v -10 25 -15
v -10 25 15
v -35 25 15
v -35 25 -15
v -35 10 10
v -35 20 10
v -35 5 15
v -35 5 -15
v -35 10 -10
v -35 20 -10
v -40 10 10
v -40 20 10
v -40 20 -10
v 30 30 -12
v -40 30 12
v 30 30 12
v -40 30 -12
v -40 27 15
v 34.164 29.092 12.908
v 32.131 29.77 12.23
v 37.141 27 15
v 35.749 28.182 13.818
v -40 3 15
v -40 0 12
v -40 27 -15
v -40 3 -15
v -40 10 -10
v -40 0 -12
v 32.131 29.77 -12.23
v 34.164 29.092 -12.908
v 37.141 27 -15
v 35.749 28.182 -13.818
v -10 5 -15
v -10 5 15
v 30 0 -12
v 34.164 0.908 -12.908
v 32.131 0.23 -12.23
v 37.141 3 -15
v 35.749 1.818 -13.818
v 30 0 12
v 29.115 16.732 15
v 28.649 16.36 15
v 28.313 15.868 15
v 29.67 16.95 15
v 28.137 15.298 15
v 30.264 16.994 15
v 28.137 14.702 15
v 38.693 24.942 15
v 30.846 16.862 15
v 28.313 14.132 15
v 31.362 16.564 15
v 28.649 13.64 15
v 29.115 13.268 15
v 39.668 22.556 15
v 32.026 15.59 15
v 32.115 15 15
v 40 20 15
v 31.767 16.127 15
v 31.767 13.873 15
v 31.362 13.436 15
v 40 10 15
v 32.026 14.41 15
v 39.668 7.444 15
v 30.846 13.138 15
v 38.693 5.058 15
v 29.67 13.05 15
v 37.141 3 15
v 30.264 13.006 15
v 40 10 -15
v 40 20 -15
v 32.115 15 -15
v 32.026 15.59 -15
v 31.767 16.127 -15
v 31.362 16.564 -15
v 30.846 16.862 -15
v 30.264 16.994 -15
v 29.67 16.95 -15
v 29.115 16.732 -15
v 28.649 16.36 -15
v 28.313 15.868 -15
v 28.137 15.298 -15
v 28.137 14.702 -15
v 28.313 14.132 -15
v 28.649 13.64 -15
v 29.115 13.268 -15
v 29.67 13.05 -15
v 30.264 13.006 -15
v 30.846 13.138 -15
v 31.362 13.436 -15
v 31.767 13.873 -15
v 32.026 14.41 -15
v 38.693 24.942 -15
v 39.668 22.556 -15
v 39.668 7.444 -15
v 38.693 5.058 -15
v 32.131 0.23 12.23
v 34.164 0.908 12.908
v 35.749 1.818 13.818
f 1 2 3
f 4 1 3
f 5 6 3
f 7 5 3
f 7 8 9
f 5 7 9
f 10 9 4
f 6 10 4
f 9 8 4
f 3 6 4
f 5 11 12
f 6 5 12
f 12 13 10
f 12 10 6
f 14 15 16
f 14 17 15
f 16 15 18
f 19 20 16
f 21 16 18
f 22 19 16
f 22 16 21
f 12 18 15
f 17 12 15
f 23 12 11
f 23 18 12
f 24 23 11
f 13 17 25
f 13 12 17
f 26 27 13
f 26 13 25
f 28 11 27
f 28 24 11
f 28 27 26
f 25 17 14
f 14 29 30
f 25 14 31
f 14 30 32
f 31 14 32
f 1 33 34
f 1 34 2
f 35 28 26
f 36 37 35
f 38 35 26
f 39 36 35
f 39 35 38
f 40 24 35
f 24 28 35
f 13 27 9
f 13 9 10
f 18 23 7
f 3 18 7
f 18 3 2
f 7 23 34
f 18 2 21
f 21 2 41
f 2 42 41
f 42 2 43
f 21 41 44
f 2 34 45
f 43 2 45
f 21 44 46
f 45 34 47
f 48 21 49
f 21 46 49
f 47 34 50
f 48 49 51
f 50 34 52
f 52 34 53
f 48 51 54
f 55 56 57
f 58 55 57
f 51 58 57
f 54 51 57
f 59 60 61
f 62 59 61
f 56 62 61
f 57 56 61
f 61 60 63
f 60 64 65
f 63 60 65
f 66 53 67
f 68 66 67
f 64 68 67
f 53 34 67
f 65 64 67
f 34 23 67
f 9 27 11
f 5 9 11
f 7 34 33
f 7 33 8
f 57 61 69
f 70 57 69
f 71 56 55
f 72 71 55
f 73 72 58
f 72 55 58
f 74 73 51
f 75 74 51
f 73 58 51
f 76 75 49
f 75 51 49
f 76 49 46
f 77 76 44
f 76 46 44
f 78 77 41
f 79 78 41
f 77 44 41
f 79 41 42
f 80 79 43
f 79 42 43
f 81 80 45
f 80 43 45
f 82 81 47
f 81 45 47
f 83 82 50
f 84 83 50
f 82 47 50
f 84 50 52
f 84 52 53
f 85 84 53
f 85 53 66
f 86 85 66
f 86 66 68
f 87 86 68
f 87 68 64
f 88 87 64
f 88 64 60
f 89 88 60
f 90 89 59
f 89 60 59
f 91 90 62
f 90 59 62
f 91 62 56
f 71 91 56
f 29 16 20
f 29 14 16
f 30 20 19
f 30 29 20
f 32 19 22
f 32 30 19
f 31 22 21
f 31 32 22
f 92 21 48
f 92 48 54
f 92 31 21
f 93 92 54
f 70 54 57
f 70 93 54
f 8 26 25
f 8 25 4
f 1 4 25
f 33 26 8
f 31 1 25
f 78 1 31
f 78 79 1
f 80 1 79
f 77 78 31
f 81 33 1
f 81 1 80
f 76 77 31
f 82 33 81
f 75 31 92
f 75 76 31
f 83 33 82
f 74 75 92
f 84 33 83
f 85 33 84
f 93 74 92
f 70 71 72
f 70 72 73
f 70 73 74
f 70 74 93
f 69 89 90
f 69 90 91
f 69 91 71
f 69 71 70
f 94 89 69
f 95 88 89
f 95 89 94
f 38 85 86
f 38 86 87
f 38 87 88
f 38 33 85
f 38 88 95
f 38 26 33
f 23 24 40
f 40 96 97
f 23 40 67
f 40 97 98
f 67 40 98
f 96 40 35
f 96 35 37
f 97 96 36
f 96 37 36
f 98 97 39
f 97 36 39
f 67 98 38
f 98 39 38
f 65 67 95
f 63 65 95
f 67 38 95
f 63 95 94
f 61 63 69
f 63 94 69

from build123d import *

# Parameters (mm, degrees)
SKETCH1_W           = 80
SKETCH1_H           = 30
BOSS_EXTRUDE1_DEPTH = 30
SKETCH2_R           = 2
CUT_EXTRUDE1_DEPTH  = 30
CHAMFER1_SIZE       = 3
SKETCH3_W           = 25
SKETCH3_H           = 20
CUT_EXTRUDE2_DEPTH  = 30
SKETCH4_W           = 20
SKETCH4_H           = 10
CUT_EXTRUDE3_DEPTH  = 20
FILLET1_R           = 10


with BuildPart() as part:
    # Sketch1 → Boss-Extrude1 (new body)
    with BuildSketch(Plane(origin=(0, 0, 0), x_dir=(1, 0, 0), z_dir=(0, 1, 0))):
        Rectangle(SKETCH1_W, SKETCH1_H)
    extrude(amount=BOSS_EXTRUDE1_DEPTH)

    # Sketch2 → Cut-Extrude1 (cut)
    with BuildSketch(Plane.XY.offset(15)):
        with Locations((30.11486463, 15)):
            Circle(SKETCH2_R)
    extrude(amount=-CUT_EXTRUDE1_DEPTH, mode=Mode.SUBTRACT)

    # Chamfer1
    chamfer1_edges = [part.edges().sort_by_distance(p)[0] for p in [
        (0, 30, 15),
        (0, 0, 15),
        (0, 0, -15),
        (0, 30, -15),
    ]]
    chamfer(chamfer1_edges, length=CHAMFER1_SIZE)

    # Sketch3 → Cut-Extrude2 (cut)
    with BuildSketch(Plane(origin=(0, 0, -15), x_dir=(-1, 0, 0), z_dir=(0, 0, -1))):
        with Locations((22.5, 15)):
            Rectangle(SKETCH3_W, SKETCH3_H)
    extrude(amount=-CUT_EXTRUDE2_DEPTH, mode=Mode.SUBTRACT)

    # Sketch4 → Cut-Extrude3 (cut)
    with BuildSketch(Plane.ZY.offset(40)):
        with Locations((0, 15)):
            Rectangle(SKETCH4_W, SKETCH4_H)
    extrude(amount=-CUT_EXTRUDE3_DEPTH, mode=Mode.SUBTRACT)

    # Fillet1
    fillet1_edges = [part.edges().sort_by_distance(p)[0] for p in [
        (40, 0, 0),
        (40, 30, 0),
    ]]
    fillet(fillet1_edges, radius=FILLET1_R)


solid = part.part
